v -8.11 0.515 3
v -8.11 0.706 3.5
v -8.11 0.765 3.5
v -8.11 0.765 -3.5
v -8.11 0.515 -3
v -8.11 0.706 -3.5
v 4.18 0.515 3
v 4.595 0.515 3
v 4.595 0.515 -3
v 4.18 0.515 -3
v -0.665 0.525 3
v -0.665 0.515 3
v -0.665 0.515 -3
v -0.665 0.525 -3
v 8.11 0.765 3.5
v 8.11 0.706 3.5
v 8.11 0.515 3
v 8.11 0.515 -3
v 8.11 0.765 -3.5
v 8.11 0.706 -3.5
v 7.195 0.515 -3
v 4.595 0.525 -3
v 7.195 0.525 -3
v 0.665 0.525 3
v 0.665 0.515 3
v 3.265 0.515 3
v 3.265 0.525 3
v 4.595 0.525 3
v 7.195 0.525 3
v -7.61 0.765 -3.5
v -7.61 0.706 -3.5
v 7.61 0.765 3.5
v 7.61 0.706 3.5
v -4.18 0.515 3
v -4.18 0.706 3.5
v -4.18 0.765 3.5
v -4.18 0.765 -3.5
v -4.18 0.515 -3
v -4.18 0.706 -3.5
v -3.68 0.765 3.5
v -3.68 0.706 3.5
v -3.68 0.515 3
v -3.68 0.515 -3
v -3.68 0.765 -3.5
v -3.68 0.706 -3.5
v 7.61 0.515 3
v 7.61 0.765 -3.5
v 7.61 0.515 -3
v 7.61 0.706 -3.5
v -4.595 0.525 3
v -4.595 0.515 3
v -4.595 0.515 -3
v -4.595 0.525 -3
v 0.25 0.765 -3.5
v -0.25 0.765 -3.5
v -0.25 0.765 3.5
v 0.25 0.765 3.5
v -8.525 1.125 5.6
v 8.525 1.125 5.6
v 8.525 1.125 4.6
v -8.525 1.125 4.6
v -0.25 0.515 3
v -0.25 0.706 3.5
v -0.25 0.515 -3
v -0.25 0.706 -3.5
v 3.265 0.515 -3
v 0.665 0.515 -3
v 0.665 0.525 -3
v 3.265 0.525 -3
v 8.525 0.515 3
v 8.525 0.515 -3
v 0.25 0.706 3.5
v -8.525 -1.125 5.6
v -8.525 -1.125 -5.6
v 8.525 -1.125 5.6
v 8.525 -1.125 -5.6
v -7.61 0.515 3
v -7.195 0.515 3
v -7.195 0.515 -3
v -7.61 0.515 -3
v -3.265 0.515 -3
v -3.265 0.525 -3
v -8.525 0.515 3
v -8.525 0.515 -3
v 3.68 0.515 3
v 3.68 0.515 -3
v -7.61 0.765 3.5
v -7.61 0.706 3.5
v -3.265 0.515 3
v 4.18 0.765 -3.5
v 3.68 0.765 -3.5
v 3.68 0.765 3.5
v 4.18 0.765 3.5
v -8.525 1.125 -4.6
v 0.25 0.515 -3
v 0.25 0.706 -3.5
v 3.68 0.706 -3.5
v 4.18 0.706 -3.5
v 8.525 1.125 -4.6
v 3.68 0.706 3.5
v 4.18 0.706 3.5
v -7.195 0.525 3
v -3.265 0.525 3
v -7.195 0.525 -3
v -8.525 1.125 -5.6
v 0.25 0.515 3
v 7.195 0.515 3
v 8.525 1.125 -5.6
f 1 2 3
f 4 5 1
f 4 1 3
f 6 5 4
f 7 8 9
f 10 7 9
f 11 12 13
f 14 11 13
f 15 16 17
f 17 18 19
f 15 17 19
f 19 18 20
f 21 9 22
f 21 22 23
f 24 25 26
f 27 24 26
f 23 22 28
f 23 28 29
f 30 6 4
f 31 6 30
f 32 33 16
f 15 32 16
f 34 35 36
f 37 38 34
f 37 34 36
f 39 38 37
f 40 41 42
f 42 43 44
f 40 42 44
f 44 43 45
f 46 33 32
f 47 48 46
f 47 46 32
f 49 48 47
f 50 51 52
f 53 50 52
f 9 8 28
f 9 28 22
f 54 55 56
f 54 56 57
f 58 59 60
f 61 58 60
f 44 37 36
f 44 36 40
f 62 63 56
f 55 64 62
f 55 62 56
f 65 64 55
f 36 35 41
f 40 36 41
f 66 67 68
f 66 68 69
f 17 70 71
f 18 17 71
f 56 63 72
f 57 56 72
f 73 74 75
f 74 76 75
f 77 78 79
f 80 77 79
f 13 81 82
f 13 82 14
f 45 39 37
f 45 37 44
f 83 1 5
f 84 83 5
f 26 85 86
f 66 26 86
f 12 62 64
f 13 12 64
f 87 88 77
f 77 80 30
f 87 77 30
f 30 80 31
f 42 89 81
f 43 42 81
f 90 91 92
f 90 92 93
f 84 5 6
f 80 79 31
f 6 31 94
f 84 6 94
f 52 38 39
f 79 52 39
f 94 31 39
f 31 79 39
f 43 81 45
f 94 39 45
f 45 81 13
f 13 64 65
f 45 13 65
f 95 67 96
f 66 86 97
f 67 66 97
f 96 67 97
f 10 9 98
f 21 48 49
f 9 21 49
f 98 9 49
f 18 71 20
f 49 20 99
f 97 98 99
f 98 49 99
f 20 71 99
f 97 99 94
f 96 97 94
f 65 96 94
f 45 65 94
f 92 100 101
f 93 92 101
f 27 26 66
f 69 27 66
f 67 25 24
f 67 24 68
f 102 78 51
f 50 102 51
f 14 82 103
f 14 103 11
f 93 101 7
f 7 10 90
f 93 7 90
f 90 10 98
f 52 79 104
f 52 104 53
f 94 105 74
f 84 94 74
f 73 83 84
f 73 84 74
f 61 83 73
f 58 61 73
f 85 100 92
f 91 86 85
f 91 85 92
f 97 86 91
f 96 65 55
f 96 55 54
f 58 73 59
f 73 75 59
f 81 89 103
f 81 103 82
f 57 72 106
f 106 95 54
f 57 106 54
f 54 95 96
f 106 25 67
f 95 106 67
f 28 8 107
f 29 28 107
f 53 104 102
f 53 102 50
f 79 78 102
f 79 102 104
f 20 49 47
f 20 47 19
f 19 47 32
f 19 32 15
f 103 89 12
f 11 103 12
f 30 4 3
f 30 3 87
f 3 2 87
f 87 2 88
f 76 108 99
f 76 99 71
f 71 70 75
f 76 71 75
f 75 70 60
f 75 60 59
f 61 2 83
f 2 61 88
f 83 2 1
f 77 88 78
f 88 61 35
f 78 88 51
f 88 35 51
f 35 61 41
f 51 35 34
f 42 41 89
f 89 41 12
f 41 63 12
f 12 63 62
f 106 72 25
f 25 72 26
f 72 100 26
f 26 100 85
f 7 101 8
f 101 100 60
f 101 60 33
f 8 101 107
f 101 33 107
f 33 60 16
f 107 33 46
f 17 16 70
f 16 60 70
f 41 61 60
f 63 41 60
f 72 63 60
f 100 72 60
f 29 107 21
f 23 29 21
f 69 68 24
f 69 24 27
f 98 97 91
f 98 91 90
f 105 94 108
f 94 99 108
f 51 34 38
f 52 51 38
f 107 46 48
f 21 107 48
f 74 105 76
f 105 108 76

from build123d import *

# Parameters (mm, degrees)
BOSS_EXTRUDE1_DEPTH = 8.525
SKETCH2_W           = 0.5
SKETCH2_H           = 7
BOSS_EXTRUDE2_DEPTH = 0.25
SKETCH3_W           = 2.6
SKETCH3_H           = 6
BOSS_EXTRUDE3_DEPTH = 0.01


with BuildPart() as part:
    # Sketch1 → Boss-Extrude1 (new, symmetric)
    with BuildSketch(Plane(origin=(0, 0, 0), x_dir=(0, 0, -1), z_dir=(1, 0, 0))):
        Polygon((-3, 0.515), (3, 0.515), (4.6, 1.125), (5.6, 1.125), (5.6, -1.125), (-5.6, -1.125), (-5.6, 1.125), (-4.6, 1.125), align=None)
    extrude(amount=BOSS_EXTRUDE1_DEPTH, both=True)

    # Sketch2 → Boss-Extrude2 (add)
    with BuildSketch(Plane(origin=(0, 0.515, 0), x_dir=(1, 0, 0), z_dir=(0, 1, 0))):
        with Locations((-7.86, 0)):
            Rectangle(SKETCH2_W, SKETCH2_H)
        with Locations((-3.93, 0)):
            Rectangle(SKETCH2_W, SKETCH2_H)
        Rectangle(SKETCH2_W, SKETCH2_H)
        with Locations((3.93, 0)):
            Rectangle(SKETCH2_W, SKETCH2_H)
        with Locations((7.86, 0)):
            Rectangle(SKETCH2_W, SKETCH2_H)
    extrude(amount=BOSS_EXTRUDE2_DEPTH)

    # Sketch3 → Boss-Extrude3 (add)
    with BuildSketch(Plane(origin=(0, 0.515, 0), x_dir=(1, 0, 0), z_dir=(0, 1, 0))):
        with Locations((-5.895, 0)):
            Rectangle(SKETCH3_W, SKETCH3_H)
        with Locations((-1.965, 0)):
            Rectangle(SKETCH3_W, SKETCH3_H)
        with Locations((1.965, 0)):
            Rectangle(SKETCH3_W, SKETCH3_H)
        with Locations((5.895, 0)):
            Rectangle(SKETCH3_W, SKETCH3_H)
    extrude(amount=BOSS_EXTRUDE3_DEPTH)


solid = part.part
